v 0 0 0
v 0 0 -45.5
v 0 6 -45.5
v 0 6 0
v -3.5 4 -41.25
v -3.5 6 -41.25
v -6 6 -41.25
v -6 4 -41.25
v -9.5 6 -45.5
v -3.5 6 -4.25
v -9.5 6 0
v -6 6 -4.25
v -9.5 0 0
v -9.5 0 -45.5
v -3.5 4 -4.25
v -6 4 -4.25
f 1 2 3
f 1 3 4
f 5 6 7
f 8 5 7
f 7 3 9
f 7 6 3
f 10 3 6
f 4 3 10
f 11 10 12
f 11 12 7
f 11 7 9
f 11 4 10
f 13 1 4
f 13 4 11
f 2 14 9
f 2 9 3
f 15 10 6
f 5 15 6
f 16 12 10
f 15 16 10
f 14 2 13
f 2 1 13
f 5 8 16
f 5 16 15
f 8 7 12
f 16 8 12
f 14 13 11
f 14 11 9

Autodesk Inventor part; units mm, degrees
ref_plane "YZ Plane" through (0, 0, 0) normal (1, 0, 0) x (0, 1, 0)
ref_plane "XZ Plane" through (0, 0, 0) normal (0, 1, 0) x (-1, 0, 0)
ref_plane "XY Plane" through (0, 0, 0) normal (0, 0, 1) x (1, 0, 0)
sketch "Sketch1" plane through (0, 0, 0) normal (0, 1, 0) x (-1, 0, 0)
  line L0 (0, 0) -> (9.5, 0)
  line L1 (9.5, 0) -> (9.5, -45.5)
  line L2 (9.5, -45.5) -> (0, -45.5)
  line L3 (0, -45.5) -> (0, 0)
  dimension "d0" = 9.5
  dimension "d1" = 45.5
extrude "Extrusion1" add sketch "Sketch1" along normal blind 6
sketch "Sketch2" plane through (0, 6, 0) normal (0, 1, 0) x (1, 0, 0)
  line L0 (-9.5, 0) -> (0, 0) projected
  line L1 (0, 0) -> (0, 45.5) projected
  line L2 (0, 45.5) -> (-9.5, 45.5) projected
  line L3 (-9.5, 45.5) -> (-9.5, 0) projected
  line L4 (-6, 4.25) -> (-3.5, 4.25)
  line L5 (-3.5, 4.25) -> (-3.5, 41.25)
  line L6 (-3.5, 41.25) -> (-6, 41.25)
  line L7 (-6, 41.25) -> (-6, 4.25)
  line L8 (-4.75, 41.25) -> (-4.75, 45.5)
  line L9 (0, 45.5) -> (-9.5, 45.5) projected
  line L10 (-6, 22.75) -> (-9.5, 22.75)
  line L11 (-9.5, 45.5) -> (-9.5, 0) projected
  line L12 (-4.75, 4.25) -> (-4.75, 0)
  line L13 (-9.5, 0) -> (0, 0) projected
  line L14 (-3.5, 22.75) -> (0, 22.75)
  dimension "d4" = 2.5
  dimension "d5" = 37
extrude "Extrusion2" cut sketch "Sketch2" against normal blind 2 contours L4 L7 L6 L5
properties part number "Linear Resistor Body"
